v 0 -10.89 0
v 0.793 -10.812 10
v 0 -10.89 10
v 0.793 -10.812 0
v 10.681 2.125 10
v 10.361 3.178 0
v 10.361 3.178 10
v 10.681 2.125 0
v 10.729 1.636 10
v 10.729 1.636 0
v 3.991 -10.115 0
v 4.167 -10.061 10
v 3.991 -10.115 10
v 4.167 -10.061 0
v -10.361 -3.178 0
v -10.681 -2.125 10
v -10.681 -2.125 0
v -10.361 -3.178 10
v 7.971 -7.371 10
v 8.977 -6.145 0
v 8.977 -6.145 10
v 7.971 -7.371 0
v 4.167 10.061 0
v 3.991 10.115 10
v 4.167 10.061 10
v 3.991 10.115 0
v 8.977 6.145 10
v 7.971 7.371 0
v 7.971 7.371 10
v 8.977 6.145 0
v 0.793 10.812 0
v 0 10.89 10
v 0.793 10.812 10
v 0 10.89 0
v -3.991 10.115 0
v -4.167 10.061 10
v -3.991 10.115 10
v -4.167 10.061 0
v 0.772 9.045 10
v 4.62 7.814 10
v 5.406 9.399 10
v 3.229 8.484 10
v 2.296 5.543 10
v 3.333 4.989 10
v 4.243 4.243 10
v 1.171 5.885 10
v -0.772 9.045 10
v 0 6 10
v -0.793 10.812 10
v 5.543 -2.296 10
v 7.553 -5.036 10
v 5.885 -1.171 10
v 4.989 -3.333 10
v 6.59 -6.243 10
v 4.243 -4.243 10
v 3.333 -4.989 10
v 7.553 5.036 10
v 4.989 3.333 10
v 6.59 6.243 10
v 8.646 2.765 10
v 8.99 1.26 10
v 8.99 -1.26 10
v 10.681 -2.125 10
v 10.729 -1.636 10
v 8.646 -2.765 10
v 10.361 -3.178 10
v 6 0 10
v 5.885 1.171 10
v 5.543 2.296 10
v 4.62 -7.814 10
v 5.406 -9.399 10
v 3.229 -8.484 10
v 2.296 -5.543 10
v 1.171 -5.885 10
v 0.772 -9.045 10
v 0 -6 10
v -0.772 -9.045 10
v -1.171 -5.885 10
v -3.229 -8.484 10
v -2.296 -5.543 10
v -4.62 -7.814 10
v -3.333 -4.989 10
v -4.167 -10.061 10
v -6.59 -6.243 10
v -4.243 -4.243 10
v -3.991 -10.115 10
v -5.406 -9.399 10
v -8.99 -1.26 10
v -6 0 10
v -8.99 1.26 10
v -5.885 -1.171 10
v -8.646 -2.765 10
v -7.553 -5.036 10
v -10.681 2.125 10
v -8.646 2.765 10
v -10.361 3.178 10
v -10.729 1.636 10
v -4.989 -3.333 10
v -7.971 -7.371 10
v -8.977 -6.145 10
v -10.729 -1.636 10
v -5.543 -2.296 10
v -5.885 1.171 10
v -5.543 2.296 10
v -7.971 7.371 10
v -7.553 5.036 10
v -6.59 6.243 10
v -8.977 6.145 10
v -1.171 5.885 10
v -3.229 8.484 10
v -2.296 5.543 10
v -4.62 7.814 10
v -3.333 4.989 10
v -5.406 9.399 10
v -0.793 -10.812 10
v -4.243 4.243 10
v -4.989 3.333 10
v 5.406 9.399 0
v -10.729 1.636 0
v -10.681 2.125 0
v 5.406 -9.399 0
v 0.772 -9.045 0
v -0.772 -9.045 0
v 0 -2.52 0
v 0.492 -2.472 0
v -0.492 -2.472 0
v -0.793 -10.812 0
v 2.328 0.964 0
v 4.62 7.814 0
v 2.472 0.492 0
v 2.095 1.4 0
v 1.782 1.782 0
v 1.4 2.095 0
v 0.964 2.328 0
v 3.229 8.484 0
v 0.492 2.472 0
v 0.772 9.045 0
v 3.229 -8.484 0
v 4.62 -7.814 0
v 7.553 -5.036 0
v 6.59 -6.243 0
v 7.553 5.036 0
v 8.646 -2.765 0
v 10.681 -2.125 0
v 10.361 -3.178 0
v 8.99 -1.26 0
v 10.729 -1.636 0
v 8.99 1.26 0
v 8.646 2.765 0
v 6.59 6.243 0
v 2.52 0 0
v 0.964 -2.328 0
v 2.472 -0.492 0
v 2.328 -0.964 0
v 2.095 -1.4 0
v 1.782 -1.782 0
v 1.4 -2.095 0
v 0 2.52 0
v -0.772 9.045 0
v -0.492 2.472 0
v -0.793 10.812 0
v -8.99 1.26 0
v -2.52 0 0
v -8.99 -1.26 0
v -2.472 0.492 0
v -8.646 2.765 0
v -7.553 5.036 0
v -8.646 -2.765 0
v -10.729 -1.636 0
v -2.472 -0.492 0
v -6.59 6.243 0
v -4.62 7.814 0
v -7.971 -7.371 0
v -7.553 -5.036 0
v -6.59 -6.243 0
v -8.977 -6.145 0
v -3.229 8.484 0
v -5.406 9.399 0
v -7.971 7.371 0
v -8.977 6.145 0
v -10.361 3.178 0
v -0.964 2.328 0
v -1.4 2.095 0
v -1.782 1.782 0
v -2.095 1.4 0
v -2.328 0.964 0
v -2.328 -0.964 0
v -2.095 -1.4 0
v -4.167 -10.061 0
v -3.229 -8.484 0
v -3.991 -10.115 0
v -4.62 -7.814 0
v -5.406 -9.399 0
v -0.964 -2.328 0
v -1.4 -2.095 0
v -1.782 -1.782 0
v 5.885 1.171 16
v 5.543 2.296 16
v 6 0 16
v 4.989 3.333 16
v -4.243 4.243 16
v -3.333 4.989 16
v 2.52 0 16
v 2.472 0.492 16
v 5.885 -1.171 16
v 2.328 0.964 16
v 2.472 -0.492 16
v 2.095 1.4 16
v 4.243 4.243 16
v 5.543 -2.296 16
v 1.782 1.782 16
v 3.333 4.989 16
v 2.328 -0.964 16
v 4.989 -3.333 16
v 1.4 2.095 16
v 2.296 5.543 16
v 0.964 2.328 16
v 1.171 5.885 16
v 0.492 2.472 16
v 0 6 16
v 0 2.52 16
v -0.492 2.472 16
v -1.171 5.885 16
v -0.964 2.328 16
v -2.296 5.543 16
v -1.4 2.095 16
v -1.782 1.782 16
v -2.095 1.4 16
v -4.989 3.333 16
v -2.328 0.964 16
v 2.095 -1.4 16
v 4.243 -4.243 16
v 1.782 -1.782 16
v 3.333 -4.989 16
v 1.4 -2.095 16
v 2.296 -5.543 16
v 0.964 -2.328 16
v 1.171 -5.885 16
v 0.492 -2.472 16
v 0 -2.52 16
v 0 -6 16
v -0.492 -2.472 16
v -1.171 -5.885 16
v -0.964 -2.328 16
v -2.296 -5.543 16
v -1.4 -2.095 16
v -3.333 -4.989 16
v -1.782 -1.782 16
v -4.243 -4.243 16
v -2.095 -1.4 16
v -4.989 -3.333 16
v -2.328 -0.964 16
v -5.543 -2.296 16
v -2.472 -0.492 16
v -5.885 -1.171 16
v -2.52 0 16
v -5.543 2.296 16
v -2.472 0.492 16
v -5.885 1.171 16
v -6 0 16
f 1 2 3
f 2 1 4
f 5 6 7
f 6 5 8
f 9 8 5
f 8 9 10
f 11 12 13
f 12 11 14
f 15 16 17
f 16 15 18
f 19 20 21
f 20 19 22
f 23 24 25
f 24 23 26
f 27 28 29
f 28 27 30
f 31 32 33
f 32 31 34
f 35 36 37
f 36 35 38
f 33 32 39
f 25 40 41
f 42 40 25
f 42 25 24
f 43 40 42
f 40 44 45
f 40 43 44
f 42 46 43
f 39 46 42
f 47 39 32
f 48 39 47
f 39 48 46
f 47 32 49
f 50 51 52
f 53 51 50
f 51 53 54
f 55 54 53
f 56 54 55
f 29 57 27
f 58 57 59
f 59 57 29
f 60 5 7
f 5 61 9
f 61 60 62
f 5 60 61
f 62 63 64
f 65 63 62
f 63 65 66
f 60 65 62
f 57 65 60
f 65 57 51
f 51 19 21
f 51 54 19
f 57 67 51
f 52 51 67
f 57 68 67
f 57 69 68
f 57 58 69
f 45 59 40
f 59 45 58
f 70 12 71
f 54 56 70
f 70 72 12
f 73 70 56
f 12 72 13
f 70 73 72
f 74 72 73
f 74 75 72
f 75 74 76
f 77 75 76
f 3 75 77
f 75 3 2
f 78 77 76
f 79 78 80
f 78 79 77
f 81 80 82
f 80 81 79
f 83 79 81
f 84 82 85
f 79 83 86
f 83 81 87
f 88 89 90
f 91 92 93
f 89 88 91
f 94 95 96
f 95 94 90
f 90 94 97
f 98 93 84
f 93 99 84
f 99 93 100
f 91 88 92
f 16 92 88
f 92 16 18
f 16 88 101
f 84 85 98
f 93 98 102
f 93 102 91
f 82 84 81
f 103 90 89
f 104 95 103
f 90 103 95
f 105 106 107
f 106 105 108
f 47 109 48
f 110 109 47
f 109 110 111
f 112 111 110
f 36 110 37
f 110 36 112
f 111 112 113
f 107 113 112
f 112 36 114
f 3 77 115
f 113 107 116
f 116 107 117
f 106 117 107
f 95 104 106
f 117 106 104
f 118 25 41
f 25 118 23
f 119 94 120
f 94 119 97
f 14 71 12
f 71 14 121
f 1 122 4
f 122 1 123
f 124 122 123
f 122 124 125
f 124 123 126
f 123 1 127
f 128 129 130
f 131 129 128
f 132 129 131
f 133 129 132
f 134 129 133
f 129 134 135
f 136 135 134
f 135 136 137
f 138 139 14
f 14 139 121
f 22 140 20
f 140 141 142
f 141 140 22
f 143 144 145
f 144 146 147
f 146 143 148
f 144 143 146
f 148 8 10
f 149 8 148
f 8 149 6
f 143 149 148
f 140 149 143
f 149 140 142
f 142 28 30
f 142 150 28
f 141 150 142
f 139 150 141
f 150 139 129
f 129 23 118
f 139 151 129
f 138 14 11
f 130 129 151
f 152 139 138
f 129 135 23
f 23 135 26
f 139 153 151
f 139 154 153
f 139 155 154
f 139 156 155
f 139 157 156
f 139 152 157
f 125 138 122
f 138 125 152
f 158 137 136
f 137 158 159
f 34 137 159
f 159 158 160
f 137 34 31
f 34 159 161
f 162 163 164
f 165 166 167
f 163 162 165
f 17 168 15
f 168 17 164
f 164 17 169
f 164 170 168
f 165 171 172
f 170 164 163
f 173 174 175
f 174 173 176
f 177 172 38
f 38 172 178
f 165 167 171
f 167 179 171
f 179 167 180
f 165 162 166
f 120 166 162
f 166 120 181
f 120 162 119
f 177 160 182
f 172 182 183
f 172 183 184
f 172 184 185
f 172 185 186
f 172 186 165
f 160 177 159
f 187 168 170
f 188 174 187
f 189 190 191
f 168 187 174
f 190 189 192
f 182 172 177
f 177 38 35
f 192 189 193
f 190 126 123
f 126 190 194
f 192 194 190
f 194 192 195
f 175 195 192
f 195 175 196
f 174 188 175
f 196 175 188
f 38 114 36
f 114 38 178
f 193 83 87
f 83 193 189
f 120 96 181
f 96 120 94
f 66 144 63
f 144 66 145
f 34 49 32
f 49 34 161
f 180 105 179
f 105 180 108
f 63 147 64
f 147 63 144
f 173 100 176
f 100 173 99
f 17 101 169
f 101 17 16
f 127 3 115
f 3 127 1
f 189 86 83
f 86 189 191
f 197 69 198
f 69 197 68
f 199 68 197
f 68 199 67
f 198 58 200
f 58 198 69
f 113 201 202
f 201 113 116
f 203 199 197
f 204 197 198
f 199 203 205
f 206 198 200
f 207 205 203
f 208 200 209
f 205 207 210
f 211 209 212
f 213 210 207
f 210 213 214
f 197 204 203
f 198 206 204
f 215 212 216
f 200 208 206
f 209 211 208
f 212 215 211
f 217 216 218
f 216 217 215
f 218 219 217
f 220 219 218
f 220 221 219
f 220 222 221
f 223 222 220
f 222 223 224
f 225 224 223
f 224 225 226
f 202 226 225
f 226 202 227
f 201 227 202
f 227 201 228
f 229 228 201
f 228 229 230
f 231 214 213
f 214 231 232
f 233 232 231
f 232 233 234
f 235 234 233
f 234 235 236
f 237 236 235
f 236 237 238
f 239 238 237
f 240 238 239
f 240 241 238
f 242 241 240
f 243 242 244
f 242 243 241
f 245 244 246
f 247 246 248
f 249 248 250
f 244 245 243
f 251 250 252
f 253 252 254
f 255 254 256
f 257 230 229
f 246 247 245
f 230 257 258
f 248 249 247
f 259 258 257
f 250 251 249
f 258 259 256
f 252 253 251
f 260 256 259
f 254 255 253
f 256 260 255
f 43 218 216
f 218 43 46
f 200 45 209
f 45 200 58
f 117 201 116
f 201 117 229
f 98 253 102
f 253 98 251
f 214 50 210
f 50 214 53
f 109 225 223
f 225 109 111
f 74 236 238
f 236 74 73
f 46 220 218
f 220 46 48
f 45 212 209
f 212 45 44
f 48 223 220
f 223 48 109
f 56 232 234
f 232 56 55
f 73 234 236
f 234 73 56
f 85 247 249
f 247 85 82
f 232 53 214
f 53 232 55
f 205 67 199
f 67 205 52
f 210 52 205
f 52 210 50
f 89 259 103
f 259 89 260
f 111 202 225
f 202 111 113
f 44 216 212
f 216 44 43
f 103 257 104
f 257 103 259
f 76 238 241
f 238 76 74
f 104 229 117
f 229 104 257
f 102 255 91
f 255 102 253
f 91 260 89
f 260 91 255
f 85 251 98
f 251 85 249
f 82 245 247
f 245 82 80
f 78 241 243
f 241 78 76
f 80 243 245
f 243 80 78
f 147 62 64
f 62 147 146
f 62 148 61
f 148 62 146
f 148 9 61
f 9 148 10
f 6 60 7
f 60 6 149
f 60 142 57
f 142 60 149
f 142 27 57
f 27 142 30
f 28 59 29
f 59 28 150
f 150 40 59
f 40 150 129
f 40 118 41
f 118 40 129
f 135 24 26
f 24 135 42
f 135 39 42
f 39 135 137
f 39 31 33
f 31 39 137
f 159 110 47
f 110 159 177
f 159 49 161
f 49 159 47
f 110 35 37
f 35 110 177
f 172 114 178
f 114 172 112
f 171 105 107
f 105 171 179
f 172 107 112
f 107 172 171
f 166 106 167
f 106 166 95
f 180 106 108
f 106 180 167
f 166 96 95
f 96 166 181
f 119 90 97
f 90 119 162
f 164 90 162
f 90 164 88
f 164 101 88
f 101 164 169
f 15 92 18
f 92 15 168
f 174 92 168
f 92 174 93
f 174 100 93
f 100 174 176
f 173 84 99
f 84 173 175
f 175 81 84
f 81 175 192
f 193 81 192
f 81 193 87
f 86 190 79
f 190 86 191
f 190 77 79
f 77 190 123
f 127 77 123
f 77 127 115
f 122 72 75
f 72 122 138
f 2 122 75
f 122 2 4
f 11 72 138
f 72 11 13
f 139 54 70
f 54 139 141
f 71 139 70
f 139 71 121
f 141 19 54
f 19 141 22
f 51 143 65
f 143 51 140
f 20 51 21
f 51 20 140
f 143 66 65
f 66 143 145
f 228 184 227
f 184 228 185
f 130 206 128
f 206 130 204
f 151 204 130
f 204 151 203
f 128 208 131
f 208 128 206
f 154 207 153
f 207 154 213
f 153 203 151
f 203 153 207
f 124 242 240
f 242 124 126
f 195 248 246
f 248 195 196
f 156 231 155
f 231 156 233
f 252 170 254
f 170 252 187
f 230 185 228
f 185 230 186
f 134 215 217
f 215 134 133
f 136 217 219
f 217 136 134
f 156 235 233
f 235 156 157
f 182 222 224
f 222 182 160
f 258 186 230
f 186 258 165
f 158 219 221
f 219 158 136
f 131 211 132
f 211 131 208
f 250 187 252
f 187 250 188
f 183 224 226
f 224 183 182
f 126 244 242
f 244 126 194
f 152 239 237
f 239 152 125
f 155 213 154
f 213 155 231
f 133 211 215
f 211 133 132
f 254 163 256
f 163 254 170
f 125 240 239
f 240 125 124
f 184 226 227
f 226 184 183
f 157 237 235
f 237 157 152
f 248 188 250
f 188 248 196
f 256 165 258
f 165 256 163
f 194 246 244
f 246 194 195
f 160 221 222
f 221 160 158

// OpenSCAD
$fn = 32;

// ----------------------------------------------------------------------
// Timing pulley: T5 14T, pitch 5 mm, 21.78 mm x 16 mm
// ----------------------------------------------------------------------

// --- parameters (mm) ---
belt_pitch = 5;           // belt pitch
n_teeth = 14;             // number of grooves
rim_w = 10;               // belt width between the flanges
tip_d = 21.78;            // tip circle diameter
root_d = 19.18;           // groove bottom diameter
groove_h = 1.3;           // groove depth
tooth_w = 3;              // groove width at the tip circle
shaft_d = 5.04;           // shaft bore
hub_d = 12;               // hub diameter
hub_h = 6;                // hub above the flange
bottom_z = 0;             // lowest point of the pulley
top_z = 16;               // highest point of the pulley

module rim() {
  cylinder(h = rim_w, d = tip_d);
}

module groove_cutter() {
  /* belt tooth groove: deeper than wide, cut through the belt width */
  translate([root_d / 2, 0, 0])
    linear_extrude(height = rim_w)
      polygon(points = [[-0.6, -tooth_w * 0.42], [groove_h + 0.6, -tooth_w * 0.6],
                        [groove_h + 0.6, tooth_w * 0.6], [-0.6, tooth_w * 0.42]]);
}

module hub() {
  translate([0, 0, bottom_z]) cylinder(h = top_z - bottom_z, d = hub_d);
}

difference() {
  union() {
    rim();
    hub();
  }
  for (i = [0 : n_teeth - 1]) rotate([0, 0, i * 360 / n_teeth]) groove_cutter();
  translate([0, 0, bottom_z - 1]) cylinder(h = top_z - bottom_z + 2, d = shaft_d);
}
